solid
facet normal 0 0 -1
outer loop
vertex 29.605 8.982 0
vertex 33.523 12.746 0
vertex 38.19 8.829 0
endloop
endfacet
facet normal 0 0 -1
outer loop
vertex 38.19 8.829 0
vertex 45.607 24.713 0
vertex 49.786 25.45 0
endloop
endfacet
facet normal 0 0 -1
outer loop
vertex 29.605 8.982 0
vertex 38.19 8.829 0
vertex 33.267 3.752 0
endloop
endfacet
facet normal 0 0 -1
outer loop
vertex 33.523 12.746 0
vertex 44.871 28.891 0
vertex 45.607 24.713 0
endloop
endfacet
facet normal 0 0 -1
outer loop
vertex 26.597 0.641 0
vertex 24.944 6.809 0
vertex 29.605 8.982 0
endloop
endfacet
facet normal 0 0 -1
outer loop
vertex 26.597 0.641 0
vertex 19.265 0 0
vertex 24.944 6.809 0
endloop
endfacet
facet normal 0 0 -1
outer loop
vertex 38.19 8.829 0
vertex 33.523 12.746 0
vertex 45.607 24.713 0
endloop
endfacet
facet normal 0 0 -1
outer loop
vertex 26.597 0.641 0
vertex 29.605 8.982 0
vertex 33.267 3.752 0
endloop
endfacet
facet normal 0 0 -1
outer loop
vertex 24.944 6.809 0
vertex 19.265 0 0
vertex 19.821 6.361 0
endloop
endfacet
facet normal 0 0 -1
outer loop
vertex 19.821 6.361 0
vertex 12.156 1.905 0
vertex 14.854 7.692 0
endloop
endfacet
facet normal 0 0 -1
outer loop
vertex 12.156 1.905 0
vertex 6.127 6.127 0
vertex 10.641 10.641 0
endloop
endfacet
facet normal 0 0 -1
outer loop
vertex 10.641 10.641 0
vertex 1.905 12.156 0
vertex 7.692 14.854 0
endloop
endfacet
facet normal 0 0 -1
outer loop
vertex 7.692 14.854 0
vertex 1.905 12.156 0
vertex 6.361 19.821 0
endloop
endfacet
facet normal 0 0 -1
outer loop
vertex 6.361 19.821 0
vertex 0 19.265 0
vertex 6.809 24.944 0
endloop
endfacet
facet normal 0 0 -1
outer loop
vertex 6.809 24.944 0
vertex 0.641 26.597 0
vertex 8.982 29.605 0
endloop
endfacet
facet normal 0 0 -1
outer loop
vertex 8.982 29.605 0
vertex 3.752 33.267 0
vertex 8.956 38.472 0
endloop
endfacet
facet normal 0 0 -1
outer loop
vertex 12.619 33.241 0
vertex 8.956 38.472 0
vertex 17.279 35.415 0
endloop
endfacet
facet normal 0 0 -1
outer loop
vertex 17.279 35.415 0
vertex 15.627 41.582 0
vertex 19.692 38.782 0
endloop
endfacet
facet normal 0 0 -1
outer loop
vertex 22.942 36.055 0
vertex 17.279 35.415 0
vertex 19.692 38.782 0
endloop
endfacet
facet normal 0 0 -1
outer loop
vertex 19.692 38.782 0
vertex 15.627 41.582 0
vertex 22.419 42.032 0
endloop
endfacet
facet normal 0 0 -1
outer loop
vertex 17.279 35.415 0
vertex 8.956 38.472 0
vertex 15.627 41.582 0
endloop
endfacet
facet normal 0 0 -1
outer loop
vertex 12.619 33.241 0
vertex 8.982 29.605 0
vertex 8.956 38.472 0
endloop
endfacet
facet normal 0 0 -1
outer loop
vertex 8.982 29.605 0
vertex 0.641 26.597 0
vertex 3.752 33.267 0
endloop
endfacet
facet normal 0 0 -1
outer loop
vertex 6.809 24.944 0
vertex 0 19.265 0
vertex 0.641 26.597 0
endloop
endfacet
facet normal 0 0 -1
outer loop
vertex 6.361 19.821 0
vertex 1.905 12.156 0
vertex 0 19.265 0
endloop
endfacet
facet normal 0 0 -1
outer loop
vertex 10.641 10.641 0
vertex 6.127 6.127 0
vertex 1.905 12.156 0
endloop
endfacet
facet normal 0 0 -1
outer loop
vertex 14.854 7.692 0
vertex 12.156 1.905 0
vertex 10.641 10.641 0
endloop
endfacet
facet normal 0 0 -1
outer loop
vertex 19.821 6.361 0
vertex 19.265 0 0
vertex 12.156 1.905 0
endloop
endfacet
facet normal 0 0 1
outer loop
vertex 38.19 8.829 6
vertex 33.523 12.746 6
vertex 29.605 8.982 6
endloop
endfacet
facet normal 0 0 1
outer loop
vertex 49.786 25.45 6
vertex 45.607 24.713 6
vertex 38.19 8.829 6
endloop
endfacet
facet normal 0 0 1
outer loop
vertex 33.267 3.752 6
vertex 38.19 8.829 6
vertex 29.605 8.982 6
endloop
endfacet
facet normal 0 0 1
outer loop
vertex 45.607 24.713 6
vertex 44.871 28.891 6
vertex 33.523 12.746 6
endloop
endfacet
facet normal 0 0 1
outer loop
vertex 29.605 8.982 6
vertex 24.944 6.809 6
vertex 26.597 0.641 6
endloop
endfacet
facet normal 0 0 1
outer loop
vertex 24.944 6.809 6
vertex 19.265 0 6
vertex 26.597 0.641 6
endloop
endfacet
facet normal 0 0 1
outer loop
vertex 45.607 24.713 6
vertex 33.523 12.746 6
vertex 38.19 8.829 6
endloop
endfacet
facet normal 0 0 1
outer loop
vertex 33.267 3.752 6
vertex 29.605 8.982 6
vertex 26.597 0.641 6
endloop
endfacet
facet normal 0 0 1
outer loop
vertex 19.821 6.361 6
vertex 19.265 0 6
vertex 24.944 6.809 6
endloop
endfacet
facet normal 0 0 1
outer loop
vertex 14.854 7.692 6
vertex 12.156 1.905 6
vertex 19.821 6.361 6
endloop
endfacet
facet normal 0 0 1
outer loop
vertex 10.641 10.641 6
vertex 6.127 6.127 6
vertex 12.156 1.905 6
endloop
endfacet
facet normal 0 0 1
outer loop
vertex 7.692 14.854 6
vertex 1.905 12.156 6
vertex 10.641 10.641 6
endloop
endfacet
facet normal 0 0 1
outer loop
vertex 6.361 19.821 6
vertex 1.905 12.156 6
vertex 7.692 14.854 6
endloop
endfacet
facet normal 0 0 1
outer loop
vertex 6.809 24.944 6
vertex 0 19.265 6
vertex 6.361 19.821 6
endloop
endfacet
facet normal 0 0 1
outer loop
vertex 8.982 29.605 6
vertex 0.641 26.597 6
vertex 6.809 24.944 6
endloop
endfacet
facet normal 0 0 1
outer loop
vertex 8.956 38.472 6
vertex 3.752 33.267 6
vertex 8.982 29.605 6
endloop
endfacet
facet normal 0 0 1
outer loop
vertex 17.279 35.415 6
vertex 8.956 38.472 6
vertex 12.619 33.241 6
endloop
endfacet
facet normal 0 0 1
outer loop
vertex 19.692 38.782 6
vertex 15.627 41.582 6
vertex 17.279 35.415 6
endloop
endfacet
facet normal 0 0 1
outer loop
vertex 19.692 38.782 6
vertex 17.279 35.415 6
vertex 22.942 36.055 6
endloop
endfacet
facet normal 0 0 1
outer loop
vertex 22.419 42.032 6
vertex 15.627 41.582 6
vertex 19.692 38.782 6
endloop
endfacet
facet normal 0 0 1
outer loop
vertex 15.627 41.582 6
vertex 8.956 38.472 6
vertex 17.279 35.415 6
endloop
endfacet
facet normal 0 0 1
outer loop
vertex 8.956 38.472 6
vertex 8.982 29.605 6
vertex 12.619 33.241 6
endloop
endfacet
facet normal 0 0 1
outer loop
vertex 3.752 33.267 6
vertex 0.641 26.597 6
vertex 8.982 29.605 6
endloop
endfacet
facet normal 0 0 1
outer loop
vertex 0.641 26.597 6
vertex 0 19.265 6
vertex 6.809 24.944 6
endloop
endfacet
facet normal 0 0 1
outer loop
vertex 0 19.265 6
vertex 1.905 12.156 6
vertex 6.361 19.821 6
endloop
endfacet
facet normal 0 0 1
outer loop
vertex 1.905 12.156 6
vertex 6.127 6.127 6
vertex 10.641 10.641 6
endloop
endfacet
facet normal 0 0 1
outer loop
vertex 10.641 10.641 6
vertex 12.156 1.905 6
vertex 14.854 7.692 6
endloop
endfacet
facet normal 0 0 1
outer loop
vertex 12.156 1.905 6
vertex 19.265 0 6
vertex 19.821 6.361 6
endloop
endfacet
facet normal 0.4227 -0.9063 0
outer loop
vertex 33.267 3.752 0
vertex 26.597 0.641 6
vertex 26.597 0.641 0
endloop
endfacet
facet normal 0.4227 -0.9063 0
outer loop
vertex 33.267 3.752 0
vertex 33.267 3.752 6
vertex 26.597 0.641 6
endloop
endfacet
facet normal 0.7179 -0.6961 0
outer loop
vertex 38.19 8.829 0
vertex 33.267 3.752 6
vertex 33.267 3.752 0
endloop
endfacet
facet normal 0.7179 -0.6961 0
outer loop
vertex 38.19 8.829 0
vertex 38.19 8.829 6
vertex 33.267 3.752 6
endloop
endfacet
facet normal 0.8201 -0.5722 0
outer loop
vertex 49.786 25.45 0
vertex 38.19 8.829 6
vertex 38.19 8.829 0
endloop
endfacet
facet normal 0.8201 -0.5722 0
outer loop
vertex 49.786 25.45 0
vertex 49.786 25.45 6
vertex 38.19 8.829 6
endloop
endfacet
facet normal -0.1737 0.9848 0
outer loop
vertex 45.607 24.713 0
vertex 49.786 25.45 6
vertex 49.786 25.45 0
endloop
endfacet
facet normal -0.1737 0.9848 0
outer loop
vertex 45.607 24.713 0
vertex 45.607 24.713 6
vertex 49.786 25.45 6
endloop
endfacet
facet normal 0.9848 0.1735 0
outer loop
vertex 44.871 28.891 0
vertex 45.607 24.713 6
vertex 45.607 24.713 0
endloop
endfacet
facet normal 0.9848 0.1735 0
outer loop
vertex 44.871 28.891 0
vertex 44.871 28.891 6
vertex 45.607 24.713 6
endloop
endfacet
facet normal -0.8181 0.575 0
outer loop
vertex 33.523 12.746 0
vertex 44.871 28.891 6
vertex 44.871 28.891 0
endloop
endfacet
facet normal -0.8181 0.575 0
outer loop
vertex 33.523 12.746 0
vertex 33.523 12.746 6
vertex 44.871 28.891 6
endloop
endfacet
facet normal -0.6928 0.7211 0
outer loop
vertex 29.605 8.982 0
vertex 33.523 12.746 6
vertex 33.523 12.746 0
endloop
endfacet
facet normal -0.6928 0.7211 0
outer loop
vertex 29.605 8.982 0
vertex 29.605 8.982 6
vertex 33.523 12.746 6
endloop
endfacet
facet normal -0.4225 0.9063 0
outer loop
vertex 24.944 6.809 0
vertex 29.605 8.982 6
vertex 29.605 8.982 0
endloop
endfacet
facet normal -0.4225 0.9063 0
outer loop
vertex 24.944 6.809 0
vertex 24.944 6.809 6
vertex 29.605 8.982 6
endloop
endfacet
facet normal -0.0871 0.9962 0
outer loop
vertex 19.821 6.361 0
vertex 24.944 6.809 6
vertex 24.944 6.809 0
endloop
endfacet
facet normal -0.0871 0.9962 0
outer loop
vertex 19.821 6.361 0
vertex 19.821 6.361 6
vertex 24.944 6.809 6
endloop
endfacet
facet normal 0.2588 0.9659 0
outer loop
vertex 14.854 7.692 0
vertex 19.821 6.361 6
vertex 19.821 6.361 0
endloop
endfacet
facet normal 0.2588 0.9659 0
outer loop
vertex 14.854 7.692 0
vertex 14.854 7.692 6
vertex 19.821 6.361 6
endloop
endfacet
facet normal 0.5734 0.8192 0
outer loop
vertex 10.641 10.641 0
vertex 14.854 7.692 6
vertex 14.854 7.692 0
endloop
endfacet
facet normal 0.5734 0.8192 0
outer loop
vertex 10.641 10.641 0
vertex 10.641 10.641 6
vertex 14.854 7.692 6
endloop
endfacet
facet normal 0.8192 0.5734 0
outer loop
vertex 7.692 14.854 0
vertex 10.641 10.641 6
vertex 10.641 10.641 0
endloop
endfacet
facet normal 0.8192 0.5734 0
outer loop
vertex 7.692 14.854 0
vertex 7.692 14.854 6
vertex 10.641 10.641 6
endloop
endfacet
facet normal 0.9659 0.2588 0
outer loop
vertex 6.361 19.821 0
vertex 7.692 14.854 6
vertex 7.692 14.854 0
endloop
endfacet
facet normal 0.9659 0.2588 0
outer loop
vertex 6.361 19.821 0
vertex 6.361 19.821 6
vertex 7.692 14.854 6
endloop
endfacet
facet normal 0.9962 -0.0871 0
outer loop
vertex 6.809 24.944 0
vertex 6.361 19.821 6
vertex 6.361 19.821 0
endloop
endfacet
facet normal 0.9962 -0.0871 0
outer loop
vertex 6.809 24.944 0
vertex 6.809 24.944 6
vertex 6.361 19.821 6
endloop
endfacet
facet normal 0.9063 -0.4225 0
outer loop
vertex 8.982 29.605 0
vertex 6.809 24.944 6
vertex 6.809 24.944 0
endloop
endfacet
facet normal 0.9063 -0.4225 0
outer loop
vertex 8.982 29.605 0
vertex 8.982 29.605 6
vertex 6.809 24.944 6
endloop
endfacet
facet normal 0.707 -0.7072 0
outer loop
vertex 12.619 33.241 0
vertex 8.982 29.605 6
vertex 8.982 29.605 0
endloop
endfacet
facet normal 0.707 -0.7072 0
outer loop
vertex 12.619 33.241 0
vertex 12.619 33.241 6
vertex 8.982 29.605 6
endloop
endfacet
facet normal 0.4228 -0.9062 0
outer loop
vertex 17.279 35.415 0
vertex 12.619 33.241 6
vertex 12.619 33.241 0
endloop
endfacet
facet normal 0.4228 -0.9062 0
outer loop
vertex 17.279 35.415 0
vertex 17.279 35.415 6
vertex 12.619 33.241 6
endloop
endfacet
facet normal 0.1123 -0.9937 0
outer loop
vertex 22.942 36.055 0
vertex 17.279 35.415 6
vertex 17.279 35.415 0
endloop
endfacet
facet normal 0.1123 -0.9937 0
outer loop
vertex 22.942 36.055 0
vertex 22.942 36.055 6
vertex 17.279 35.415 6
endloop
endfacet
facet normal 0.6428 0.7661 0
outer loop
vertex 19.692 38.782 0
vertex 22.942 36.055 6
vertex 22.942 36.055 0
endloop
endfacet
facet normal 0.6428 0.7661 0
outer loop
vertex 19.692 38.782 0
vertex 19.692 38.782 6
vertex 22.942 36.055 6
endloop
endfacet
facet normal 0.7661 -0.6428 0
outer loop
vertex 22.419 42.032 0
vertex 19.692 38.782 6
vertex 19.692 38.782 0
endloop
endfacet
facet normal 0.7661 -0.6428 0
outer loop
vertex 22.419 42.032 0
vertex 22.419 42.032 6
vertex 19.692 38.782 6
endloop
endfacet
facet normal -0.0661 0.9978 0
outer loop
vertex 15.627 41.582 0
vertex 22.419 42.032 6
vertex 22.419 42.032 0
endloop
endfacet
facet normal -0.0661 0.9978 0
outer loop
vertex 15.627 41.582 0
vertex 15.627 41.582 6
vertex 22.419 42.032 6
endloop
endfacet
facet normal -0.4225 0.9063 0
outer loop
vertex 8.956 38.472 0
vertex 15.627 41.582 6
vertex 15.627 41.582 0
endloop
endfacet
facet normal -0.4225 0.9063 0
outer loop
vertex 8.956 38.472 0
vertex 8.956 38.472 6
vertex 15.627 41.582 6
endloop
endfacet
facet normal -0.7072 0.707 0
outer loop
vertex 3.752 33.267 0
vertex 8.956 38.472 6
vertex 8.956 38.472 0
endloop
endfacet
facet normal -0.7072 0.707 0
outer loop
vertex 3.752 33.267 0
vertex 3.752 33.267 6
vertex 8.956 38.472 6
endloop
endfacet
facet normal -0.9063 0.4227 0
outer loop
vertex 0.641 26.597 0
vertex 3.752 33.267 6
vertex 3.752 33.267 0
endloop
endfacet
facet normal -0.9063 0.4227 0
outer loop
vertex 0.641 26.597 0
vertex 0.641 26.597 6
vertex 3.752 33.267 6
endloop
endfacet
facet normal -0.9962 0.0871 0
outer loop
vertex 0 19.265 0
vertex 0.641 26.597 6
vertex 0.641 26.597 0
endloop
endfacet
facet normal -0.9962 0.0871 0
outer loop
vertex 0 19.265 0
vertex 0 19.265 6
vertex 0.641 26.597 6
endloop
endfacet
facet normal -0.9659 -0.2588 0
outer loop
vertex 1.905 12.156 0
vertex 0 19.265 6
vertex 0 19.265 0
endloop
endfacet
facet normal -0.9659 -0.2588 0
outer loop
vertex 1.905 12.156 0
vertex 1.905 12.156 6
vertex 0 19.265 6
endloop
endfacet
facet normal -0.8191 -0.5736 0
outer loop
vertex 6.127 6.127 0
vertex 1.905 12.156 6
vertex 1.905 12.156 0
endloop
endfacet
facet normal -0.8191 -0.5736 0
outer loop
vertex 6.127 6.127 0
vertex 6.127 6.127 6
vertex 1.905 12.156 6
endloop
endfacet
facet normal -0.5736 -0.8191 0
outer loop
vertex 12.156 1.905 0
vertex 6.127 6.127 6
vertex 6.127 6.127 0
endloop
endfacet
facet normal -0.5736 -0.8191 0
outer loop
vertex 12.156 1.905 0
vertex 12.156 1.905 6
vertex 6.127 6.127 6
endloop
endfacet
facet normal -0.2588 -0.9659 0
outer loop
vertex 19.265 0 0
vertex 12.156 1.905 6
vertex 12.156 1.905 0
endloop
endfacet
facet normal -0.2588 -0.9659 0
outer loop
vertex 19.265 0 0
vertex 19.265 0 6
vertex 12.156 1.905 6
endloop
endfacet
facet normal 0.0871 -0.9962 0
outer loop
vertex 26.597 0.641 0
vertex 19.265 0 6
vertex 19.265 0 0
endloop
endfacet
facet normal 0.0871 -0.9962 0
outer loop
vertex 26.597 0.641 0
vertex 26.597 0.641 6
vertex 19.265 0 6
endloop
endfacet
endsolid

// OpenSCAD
$fn = 32;

// ----------------------------------------------------------------------
// Eye lug: ring_tail, 6 mm thick
// ----------------------------------------------------------------------

// --- parameters (mm) ---
profile_height = 6;       // extrusion height
profile_points = 30;      // points of the closed outline

profile = [[19.692, 38.782], [22.419, 42.032], [15.627, 41.582], [8.956, 38.472], [3.752, 33.267], [0.641, 26.597], [0, 19.265], [1.905, 12.156], [6.127, 6.127], [12.156, 1.905], [19.265, 0], [26.597, 0.641], [33.267, 3.752], [38.19, 8.829], [49.786, 25.45], [45.607, 24.713], [44.871, 28.891], [33.523, 12.746], [29.605, 8.982], [24.944, 6.809], [19.821, 6.361], [14.854, 7.692], [10.641, 10.641], [7.692, 14.854], [6.361, 19.821], [6.809, 24.944], [8.982, 29.605], [12.619, 33.241], [17.279, 35.415], [22.942, 36.055]];  // single closed polygon, 30 points, counter clockwise

// --- the one profile operation ---
linear_extrude(height = profile_height) polygon(points = profile);
